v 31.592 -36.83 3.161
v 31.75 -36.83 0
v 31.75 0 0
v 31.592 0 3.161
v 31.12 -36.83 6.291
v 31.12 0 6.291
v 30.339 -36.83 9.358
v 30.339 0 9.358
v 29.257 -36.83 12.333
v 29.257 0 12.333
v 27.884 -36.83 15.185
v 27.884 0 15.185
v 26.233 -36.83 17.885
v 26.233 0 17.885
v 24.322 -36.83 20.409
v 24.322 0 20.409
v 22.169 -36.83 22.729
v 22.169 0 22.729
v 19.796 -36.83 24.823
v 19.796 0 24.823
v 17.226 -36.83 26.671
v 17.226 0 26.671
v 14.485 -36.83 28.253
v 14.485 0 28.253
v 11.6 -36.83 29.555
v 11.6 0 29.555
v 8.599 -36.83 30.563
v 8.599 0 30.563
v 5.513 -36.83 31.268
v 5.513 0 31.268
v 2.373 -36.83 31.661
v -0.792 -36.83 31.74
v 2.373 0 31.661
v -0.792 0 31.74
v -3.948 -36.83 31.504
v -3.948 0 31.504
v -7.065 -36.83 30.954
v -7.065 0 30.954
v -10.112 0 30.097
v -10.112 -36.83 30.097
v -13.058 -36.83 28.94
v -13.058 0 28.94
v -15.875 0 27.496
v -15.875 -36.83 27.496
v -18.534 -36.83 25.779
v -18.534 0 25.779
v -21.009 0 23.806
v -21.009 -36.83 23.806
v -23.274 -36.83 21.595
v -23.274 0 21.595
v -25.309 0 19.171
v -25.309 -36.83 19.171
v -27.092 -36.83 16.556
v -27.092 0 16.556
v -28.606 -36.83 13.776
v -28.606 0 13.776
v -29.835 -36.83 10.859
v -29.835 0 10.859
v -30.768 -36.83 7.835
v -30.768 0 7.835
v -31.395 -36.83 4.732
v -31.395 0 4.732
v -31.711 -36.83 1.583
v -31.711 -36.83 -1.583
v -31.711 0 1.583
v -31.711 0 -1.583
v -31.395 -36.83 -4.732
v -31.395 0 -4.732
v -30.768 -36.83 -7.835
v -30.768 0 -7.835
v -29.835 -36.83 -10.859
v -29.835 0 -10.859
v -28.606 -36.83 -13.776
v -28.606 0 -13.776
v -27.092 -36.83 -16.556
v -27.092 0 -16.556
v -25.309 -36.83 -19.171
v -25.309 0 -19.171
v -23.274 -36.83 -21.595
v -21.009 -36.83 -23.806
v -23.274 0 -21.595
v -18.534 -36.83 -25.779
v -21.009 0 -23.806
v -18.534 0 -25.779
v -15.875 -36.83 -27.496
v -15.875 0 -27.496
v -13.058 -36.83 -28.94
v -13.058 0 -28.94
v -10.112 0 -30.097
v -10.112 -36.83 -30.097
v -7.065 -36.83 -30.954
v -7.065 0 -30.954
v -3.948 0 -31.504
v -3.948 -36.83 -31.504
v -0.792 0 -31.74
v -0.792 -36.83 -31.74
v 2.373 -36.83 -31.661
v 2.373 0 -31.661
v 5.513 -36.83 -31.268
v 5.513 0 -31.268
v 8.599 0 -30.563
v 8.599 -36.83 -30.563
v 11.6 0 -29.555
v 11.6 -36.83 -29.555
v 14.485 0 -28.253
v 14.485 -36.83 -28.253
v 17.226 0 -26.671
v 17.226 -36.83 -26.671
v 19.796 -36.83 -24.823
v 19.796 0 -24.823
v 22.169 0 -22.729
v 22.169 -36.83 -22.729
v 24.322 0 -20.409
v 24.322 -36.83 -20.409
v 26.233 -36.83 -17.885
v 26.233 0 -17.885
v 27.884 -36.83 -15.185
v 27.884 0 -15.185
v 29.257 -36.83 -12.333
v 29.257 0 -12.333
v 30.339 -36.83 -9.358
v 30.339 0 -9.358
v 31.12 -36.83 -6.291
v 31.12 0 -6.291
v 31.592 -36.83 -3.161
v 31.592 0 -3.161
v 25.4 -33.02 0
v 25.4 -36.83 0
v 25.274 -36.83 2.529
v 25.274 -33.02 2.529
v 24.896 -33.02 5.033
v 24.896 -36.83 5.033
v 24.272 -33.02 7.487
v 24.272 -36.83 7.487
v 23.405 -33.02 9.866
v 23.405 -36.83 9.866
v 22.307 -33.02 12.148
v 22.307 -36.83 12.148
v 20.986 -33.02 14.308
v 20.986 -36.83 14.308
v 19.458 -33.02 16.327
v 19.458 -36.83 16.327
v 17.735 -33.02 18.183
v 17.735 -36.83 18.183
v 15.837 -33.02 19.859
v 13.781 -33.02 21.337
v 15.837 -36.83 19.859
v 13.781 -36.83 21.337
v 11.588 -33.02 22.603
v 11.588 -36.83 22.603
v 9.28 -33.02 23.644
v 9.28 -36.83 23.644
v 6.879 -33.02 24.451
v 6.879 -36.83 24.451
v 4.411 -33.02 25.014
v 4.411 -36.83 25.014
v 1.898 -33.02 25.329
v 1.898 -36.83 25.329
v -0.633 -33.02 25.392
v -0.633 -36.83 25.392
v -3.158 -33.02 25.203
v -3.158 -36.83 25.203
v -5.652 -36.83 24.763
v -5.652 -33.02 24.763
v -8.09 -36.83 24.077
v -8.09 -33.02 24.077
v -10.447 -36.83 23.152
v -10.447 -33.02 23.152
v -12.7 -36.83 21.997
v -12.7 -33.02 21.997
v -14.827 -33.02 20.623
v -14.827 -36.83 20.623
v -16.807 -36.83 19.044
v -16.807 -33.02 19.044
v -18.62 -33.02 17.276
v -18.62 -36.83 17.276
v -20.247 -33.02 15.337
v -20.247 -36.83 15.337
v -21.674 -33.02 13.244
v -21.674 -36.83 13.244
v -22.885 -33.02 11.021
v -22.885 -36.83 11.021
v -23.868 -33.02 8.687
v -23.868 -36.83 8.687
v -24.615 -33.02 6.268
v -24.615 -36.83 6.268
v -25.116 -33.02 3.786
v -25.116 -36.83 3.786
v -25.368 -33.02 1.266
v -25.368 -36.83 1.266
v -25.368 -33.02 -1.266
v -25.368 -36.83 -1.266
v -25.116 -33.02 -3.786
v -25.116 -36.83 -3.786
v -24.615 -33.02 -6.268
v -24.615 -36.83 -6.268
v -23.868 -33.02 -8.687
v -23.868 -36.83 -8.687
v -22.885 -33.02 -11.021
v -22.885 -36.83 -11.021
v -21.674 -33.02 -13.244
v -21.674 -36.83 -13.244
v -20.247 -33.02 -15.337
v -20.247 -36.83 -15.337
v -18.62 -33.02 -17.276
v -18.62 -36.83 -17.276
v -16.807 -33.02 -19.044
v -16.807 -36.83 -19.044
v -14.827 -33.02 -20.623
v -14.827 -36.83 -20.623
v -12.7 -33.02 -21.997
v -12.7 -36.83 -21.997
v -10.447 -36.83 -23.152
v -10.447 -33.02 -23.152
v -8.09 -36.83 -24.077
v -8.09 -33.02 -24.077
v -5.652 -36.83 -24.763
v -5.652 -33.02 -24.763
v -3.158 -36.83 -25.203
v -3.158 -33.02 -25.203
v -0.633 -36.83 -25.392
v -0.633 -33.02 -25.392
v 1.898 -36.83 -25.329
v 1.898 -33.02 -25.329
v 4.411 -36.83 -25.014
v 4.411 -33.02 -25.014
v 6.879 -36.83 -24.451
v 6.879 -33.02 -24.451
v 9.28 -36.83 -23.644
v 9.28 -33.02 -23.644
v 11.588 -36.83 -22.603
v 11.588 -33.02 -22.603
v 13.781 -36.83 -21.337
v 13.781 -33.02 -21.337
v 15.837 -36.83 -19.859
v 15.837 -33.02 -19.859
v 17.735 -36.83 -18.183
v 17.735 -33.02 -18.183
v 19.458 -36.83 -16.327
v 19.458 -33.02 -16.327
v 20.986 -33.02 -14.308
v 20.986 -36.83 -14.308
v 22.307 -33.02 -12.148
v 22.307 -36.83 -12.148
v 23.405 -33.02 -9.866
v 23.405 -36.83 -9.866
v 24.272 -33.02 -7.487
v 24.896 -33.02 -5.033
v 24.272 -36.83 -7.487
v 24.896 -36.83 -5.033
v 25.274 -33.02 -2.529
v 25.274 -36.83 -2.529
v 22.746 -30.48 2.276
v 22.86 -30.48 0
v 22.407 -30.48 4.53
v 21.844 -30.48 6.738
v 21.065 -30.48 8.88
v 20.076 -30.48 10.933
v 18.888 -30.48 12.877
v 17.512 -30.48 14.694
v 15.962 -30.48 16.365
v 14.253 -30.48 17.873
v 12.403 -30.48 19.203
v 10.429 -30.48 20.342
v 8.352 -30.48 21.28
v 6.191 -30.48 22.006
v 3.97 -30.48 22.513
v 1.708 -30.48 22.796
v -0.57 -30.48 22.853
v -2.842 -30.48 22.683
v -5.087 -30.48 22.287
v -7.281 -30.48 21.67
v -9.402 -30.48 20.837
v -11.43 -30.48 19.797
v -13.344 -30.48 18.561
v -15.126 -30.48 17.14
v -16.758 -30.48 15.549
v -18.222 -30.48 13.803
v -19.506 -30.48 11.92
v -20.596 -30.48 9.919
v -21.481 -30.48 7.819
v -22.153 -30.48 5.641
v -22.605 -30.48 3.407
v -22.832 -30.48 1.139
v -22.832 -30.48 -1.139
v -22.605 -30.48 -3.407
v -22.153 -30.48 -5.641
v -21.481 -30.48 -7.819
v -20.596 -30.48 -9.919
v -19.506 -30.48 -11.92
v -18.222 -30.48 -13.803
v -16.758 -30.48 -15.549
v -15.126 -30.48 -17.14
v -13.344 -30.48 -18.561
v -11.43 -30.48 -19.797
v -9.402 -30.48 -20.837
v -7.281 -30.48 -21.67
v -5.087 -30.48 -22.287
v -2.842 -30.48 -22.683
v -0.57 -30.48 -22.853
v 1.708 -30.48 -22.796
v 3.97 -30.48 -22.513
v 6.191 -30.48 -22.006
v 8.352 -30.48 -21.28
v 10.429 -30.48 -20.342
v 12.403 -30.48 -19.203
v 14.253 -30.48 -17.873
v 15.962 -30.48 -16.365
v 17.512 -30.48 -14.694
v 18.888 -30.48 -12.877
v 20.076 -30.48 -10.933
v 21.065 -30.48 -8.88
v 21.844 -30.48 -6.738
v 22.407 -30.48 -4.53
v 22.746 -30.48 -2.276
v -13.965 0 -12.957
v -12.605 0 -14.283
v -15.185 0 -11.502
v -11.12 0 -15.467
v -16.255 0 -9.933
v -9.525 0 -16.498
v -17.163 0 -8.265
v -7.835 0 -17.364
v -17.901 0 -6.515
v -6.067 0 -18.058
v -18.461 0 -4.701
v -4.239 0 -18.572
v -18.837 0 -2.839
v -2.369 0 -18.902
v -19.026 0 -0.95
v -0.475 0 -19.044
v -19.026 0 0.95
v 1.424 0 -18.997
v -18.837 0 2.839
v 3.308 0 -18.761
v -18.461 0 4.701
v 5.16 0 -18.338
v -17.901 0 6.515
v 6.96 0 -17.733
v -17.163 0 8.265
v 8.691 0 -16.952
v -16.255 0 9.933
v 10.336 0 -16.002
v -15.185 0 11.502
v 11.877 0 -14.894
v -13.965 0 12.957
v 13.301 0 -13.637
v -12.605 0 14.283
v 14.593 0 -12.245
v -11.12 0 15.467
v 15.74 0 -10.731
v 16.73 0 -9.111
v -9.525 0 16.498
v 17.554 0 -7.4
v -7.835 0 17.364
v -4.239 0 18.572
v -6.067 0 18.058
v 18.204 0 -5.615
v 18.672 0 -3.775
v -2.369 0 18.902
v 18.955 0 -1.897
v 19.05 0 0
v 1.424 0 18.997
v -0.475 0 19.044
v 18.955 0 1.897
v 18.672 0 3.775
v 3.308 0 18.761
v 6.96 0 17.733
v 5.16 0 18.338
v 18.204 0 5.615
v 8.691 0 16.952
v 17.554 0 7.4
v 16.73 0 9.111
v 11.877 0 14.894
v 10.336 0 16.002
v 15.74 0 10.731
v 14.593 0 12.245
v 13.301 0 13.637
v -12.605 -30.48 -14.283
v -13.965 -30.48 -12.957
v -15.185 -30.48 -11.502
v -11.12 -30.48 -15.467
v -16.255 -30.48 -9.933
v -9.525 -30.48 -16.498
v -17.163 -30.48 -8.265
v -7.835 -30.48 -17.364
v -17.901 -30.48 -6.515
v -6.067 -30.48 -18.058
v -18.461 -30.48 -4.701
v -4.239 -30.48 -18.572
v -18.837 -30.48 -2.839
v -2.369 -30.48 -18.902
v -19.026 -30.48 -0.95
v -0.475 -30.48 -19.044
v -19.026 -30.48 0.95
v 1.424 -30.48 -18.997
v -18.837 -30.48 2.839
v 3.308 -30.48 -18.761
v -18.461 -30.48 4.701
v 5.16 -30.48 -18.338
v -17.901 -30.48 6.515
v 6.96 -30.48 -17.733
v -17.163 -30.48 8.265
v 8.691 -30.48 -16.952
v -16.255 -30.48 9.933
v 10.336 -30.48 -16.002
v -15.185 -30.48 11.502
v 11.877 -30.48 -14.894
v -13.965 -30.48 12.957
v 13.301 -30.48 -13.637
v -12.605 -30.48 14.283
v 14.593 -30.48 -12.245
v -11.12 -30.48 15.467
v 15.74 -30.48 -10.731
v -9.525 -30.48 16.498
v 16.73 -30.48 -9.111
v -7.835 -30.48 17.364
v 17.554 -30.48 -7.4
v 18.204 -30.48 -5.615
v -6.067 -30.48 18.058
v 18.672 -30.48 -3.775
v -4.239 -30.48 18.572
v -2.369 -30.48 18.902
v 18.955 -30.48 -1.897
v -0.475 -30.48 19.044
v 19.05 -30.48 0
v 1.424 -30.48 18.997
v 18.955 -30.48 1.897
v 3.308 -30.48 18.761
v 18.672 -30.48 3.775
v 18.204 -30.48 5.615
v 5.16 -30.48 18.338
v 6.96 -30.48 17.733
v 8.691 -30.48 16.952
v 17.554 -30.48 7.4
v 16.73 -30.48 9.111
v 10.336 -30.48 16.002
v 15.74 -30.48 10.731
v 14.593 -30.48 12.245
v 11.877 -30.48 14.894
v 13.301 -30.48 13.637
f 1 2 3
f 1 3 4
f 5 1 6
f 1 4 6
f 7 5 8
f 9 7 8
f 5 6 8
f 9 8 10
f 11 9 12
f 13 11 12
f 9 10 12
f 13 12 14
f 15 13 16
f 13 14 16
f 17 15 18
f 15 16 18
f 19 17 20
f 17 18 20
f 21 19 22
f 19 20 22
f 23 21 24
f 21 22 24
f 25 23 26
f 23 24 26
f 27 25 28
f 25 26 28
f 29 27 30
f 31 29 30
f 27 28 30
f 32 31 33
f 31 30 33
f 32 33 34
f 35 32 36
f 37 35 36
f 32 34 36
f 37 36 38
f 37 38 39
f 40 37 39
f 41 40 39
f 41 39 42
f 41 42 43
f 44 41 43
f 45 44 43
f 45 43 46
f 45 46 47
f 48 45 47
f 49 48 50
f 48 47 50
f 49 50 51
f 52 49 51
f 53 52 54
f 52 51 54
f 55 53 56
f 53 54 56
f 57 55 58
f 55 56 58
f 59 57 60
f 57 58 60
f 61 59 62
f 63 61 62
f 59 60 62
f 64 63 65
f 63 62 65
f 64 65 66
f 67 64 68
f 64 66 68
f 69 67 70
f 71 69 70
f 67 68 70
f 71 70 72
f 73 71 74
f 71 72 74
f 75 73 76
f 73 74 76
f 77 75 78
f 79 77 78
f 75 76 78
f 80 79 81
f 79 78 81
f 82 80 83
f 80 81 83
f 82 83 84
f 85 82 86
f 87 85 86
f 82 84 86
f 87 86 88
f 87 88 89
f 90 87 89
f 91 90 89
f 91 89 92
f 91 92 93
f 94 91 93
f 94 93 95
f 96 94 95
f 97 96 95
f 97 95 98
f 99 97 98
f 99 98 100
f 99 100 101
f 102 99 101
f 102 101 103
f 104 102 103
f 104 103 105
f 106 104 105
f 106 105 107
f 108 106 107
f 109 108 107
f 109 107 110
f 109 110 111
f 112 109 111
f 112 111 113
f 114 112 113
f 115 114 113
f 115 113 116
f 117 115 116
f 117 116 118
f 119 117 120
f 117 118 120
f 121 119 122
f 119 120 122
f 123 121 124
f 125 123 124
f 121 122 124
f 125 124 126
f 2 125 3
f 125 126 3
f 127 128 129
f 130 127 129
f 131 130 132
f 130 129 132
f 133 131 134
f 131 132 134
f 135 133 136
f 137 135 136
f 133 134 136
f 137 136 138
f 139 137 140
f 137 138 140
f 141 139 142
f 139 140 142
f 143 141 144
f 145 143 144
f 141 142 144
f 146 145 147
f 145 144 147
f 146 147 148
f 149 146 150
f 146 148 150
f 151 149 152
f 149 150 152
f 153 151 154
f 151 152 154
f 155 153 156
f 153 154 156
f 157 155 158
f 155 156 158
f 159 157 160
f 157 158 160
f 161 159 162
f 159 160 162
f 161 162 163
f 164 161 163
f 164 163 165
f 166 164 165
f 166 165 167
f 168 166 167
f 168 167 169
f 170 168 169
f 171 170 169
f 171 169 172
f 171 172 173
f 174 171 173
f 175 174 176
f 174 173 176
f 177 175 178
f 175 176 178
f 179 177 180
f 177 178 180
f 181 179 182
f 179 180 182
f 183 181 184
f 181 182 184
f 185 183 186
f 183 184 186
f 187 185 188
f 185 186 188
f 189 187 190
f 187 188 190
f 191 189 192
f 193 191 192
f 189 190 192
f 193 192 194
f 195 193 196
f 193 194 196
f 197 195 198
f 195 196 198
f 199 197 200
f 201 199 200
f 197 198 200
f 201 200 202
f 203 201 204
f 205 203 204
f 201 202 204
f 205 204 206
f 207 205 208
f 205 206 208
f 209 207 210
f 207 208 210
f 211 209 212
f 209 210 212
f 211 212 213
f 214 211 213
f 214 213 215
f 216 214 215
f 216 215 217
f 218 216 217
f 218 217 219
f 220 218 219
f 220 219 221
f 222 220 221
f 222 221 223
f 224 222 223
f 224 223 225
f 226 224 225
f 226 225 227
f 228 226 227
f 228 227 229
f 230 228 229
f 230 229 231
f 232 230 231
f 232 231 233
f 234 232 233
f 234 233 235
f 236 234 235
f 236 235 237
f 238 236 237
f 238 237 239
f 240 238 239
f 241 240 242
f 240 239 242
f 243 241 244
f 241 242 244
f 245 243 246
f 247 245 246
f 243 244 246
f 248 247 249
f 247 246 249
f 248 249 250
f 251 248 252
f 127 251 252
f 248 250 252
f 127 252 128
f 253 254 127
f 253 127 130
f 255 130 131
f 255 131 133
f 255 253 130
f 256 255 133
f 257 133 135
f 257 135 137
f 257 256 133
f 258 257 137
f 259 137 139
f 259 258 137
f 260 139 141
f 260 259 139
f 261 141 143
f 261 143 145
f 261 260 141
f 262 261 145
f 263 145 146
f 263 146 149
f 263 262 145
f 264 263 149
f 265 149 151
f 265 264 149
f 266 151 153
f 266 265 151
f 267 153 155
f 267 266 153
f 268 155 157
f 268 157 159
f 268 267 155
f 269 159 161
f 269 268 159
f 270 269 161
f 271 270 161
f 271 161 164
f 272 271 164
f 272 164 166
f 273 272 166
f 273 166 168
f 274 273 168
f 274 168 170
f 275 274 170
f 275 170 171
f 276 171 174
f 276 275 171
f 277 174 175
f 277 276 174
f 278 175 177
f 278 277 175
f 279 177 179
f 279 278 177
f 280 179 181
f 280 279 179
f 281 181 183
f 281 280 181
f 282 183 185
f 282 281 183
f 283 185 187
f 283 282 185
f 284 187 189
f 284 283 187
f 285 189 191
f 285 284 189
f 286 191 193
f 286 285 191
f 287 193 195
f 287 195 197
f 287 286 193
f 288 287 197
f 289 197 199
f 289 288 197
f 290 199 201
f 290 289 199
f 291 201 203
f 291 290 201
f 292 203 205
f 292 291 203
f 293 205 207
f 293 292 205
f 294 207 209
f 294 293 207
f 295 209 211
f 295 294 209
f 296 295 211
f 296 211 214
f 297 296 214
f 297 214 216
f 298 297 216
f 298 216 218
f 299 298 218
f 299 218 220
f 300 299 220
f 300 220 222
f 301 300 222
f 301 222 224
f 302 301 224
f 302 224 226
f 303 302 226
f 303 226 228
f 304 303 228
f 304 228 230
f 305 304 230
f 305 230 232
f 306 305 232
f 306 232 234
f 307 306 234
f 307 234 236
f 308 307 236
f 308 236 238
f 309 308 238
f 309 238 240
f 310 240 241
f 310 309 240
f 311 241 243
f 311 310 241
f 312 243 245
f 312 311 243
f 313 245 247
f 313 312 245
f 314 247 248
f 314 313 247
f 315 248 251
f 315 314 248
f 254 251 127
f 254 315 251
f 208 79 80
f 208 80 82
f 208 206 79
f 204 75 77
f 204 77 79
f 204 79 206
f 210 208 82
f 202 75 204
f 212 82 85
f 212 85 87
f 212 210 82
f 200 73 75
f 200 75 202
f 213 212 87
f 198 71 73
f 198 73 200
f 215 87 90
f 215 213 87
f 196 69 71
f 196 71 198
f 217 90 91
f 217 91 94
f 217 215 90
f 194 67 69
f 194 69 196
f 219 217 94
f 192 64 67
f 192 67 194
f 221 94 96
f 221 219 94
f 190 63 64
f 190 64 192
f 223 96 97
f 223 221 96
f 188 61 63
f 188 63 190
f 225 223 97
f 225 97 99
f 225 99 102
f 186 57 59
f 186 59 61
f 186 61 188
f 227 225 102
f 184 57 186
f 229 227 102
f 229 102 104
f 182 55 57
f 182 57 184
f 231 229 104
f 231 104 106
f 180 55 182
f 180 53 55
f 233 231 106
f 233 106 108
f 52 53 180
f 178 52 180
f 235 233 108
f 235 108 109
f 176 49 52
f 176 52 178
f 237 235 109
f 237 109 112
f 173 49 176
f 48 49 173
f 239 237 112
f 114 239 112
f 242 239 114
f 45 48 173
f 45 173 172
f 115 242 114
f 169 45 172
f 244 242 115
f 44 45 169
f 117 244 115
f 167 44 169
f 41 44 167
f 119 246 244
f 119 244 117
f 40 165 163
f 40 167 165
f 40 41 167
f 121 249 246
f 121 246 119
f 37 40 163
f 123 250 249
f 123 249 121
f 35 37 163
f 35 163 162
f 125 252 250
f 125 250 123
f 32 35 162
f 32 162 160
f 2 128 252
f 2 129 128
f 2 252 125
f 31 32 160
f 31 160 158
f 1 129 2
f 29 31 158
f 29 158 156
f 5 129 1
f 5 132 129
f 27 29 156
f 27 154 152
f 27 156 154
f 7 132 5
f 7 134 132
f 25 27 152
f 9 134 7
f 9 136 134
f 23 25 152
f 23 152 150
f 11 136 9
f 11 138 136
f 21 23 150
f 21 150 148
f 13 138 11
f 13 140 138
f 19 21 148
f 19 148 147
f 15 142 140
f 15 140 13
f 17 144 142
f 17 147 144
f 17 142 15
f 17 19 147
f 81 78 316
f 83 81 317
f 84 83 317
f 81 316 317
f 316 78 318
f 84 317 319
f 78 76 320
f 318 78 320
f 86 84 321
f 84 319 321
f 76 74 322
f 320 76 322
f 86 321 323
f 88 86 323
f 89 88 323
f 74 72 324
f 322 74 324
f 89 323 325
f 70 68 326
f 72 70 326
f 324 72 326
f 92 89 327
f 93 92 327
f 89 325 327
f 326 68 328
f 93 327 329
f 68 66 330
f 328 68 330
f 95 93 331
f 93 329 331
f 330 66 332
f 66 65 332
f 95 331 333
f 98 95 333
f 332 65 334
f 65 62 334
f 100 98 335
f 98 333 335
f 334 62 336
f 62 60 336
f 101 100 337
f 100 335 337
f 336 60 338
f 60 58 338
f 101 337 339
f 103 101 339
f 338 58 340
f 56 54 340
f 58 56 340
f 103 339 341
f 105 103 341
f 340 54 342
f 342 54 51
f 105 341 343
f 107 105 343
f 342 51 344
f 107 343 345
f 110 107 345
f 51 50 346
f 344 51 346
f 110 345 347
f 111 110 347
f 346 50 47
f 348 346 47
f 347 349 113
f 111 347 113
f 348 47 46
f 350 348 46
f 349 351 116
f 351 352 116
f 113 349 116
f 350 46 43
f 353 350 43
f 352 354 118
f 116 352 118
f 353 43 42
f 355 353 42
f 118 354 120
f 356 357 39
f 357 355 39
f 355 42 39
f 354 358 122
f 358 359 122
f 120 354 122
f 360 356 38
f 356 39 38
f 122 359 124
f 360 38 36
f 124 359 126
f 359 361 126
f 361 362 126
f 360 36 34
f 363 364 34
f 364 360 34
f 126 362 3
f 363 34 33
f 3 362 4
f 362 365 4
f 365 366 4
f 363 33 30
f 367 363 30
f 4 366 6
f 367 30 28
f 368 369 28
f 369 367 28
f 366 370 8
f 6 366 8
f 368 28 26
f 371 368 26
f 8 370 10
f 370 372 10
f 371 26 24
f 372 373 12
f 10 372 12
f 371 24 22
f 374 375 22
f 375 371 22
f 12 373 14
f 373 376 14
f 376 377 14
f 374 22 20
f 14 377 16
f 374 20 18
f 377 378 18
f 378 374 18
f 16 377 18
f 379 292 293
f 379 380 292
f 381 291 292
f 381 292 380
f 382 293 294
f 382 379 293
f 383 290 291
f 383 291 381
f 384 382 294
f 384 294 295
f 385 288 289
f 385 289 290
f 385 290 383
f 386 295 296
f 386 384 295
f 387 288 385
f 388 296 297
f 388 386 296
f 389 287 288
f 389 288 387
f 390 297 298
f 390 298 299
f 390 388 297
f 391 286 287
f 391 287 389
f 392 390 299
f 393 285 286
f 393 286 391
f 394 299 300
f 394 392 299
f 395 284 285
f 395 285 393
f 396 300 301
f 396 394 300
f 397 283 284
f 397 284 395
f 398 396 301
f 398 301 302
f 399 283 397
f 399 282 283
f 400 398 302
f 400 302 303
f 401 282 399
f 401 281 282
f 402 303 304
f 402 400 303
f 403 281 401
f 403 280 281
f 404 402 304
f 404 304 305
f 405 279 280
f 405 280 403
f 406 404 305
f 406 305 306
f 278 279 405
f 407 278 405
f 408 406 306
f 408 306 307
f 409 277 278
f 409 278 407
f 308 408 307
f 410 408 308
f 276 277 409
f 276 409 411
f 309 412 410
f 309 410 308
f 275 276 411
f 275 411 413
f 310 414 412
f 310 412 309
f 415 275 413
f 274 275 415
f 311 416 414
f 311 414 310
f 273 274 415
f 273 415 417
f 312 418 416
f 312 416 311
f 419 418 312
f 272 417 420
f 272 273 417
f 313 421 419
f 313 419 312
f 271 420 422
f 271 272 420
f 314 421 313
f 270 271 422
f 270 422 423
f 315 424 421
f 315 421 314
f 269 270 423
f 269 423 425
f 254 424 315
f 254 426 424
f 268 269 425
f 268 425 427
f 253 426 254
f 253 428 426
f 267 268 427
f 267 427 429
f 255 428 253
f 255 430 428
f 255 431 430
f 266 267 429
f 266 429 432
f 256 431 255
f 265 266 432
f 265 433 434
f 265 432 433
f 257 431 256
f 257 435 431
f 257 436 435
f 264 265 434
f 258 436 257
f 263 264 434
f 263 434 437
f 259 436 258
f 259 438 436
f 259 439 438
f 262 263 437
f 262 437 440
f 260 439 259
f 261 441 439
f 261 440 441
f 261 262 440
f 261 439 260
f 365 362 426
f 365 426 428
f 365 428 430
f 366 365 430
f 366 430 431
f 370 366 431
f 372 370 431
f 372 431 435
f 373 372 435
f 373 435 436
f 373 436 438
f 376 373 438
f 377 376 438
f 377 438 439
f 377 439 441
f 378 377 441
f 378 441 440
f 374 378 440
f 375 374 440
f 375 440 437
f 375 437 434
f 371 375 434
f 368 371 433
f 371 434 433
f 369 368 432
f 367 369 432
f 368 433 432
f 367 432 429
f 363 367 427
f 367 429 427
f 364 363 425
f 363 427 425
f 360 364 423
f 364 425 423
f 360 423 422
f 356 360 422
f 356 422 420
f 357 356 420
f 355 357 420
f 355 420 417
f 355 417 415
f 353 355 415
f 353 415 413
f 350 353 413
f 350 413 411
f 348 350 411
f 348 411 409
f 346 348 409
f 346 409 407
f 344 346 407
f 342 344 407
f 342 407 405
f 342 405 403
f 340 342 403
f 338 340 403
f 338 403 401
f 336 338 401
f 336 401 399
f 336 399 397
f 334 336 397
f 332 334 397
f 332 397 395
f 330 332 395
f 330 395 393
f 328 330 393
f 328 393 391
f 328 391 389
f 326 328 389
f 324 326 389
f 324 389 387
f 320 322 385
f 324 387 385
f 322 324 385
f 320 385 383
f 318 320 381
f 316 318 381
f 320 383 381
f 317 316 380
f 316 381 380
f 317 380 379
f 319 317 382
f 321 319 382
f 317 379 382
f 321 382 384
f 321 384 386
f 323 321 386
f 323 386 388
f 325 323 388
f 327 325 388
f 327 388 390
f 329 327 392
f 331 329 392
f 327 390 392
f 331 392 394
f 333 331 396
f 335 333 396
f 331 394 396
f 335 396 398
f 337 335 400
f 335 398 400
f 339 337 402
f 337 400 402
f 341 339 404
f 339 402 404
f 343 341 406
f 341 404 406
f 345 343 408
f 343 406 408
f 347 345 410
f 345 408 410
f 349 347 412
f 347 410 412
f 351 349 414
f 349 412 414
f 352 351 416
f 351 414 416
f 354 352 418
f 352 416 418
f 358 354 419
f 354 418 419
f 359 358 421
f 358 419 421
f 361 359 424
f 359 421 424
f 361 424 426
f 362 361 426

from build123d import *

# Parameters (mm, degrees)
F0_R     = 31.75
F1_DEPTH = 36.83
F2_R     = 25.4
F3_DEPTH = 6.35
F4_SIZE  = 2.54
F5_R     = 19.05
F6_DEPTH = 30.481


with BuildPart() as f1:
    # F0 (on Front) → F1 (new body)
    with BuildSketch(Plane.XZ):
        Circle(F0_R)
    extrude(amount=F1_DEPTH)

    # F2 (on face) → F3 (cut)
    with BuildSketch(Plane.XZ.offset(36.83)):
        Circle(F2_R)
    extrude(amount=-F3_DEPTH, mode=Mode.SUBTRACT)

    # F4
    f4_edges = [f1.edges().sort_by_distance(p)[0] for p in [
        (-25.4, -30.48, 0),
    ]]
    chamfer(f4_edges, length=F4_SIZE)

    # F5 (on face) → F6 (cut, through all)
    with BuildSketch(Plane.XZ.offset(30.48)):
        Circle(F5_R)
    extrude(amount=-F6_DEPTH, mode=Mode.SUBTRACT)


solid = f1.part
